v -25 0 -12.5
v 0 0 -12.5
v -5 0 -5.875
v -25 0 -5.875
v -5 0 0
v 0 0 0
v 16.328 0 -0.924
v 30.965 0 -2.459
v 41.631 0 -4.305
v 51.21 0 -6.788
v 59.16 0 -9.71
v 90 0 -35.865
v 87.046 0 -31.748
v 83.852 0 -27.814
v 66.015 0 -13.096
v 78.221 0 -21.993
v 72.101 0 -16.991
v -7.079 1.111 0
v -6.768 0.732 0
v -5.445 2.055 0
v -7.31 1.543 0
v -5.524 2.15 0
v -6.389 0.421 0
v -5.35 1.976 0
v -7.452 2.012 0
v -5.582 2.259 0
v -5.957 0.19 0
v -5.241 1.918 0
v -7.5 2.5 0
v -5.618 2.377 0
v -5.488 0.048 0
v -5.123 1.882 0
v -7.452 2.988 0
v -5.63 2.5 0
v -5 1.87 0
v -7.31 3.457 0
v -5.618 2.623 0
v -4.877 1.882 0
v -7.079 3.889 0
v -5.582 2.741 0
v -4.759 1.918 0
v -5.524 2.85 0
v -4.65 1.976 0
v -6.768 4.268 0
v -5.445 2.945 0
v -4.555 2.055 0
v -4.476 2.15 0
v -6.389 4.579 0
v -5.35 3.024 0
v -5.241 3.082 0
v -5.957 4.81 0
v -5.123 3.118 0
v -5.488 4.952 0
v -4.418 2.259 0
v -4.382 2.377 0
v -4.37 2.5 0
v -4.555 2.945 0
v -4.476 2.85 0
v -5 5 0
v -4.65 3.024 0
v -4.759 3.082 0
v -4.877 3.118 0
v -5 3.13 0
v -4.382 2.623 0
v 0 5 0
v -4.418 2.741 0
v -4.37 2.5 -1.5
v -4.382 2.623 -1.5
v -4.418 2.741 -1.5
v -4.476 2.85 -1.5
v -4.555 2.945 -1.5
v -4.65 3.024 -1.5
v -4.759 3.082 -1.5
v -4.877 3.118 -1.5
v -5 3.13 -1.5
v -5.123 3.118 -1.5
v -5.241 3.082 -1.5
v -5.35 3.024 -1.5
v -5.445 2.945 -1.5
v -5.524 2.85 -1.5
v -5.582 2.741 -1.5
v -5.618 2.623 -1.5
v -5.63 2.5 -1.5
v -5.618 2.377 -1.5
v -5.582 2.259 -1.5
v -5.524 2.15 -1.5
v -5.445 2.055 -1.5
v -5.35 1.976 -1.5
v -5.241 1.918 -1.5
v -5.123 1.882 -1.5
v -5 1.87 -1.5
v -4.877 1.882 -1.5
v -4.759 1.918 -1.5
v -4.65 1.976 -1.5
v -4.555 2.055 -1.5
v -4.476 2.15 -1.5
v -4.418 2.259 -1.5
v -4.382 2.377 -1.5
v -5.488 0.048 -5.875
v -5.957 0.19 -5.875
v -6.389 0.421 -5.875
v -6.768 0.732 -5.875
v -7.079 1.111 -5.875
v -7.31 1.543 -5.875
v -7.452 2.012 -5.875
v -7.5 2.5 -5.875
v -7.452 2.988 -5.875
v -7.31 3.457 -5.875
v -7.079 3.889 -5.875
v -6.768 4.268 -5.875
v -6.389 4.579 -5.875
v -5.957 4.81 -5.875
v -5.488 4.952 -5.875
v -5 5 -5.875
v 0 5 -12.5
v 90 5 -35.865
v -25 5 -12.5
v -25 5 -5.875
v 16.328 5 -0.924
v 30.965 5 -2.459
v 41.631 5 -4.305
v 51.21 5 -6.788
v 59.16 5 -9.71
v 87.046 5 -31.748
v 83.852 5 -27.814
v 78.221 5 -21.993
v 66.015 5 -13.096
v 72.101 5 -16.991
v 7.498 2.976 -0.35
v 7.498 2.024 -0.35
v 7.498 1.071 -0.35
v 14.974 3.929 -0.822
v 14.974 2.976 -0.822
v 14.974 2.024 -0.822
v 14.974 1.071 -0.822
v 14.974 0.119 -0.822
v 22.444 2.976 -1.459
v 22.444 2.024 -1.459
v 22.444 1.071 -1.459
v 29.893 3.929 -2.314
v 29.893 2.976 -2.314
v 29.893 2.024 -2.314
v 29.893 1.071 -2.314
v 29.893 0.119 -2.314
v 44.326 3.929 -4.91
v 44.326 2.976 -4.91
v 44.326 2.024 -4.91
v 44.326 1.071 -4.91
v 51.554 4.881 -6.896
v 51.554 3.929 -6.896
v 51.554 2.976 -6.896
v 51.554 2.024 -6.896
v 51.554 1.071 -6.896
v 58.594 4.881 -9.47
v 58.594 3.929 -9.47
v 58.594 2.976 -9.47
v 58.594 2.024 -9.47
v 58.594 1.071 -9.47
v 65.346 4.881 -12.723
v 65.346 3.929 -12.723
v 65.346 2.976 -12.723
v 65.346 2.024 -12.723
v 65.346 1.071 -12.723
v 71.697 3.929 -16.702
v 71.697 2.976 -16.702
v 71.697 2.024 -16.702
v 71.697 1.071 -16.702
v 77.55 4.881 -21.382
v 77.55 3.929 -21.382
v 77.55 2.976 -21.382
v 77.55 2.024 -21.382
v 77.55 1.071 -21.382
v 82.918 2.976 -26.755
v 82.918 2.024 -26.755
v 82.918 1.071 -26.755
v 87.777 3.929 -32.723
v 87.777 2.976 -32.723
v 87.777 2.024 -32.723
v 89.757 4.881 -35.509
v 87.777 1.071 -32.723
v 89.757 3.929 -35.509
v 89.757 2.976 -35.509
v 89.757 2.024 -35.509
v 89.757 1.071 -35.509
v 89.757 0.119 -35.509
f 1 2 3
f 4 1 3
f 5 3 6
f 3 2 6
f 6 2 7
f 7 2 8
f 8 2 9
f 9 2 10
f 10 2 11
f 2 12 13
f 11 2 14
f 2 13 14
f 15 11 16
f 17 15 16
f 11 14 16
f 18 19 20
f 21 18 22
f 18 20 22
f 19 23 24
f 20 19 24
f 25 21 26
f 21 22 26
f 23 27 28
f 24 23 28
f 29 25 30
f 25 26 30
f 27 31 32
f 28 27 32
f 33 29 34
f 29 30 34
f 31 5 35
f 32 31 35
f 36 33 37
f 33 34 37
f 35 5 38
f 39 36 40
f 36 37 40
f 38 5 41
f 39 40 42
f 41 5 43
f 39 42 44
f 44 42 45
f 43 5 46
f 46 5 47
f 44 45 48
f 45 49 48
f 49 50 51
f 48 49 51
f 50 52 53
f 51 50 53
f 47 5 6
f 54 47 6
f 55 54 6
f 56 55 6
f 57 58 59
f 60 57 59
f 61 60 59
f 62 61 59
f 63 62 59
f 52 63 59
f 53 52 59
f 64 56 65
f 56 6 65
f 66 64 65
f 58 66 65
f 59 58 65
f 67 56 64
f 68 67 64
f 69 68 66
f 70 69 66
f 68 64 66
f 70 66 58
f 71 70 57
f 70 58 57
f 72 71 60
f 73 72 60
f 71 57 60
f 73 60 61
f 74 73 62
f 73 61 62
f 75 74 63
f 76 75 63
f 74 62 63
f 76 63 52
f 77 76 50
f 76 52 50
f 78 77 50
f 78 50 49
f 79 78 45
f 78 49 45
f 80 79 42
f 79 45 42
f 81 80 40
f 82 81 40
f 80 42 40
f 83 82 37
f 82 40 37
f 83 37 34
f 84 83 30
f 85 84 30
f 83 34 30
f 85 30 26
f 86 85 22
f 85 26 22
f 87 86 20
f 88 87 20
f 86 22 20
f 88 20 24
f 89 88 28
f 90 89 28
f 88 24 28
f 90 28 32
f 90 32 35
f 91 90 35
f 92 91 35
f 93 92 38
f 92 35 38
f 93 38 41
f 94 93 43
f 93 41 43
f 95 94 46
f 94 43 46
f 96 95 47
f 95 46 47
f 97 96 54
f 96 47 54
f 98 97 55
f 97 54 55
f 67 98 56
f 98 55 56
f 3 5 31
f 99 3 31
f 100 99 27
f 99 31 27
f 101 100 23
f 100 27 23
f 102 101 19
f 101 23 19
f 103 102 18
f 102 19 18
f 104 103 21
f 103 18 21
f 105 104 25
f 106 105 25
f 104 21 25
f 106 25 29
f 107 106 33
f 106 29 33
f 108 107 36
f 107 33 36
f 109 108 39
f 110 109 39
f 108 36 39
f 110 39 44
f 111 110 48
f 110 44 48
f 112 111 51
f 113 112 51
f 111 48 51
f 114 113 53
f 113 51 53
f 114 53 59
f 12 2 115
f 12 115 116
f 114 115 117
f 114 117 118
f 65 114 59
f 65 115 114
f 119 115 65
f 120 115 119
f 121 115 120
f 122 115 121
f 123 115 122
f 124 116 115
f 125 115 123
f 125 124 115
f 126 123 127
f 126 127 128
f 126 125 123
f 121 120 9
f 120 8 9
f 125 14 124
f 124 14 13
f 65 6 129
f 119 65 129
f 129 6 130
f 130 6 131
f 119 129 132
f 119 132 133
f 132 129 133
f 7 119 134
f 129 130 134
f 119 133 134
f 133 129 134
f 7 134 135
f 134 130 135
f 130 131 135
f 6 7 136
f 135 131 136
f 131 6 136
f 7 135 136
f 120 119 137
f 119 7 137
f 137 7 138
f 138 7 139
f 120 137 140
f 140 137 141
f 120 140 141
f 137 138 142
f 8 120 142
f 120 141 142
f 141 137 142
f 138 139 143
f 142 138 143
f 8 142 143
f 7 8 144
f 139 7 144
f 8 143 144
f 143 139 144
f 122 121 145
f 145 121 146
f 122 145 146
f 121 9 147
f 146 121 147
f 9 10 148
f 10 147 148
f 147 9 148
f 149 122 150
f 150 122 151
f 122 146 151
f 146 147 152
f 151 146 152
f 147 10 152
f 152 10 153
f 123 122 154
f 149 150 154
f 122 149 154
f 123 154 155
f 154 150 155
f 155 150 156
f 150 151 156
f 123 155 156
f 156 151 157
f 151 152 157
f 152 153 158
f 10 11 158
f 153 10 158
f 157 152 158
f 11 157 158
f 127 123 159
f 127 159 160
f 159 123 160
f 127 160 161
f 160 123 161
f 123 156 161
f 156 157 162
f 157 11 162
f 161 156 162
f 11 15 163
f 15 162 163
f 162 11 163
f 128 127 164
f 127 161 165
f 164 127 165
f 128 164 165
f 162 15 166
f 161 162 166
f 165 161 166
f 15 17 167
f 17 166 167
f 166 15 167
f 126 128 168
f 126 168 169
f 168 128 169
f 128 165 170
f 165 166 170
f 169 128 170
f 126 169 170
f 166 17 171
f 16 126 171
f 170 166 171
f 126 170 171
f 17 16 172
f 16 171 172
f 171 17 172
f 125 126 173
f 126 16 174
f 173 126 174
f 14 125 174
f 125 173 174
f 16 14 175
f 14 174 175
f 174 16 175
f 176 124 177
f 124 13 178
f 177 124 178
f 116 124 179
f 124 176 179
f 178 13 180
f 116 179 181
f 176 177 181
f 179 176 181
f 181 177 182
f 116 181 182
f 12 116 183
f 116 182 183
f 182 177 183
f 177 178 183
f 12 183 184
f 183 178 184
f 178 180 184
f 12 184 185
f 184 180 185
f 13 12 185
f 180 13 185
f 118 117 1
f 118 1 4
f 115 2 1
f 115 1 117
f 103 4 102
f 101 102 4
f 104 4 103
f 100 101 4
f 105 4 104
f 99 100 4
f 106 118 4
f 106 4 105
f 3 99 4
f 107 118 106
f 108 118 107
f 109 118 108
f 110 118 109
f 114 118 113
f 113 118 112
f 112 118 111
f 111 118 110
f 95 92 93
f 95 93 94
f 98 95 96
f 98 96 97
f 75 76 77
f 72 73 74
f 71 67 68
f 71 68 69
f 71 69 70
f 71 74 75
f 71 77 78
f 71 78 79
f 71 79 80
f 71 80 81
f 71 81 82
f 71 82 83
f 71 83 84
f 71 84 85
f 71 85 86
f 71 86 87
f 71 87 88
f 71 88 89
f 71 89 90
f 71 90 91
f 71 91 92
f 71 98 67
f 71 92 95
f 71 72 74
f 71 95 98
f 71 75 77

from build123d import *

# Parameters (mm, degrees)
SALIENTE_EXTRUIR1_DEPTH = 5
CROQUIS3_W              = 12.5
CROQUIS3_H              = 5
SALIENTE_EXTRUIR2_DEPTH = 25
CROQUIS6_R              = 0.63
CORTAR_EXTRUIR3_DEPTH   = 1.5
CORTAR_EXTRUIR4_DEPTH   = 5.875


with BuildPart() as part:
    # Croquis2 → Saliente-Extruir1 (new body)
    with BuildSketch(Plane(origin=(0, 0, 0), x_dir=(1, 0, 0), z_dir=(0, 1, 0))):
        with BuildLine():
            Line((0, 0), (0, 12.5))
            Line((0, 12.5), (90, 35.865427318))
            add(Edge.make_bspline(
                [(0, 0), (0.394136999, 0.015797336), (1.194952966, 0.048834045), (2.992448828, 0.125211317), (4.579856068, 0.200911656), (6.612637351, 0.301249971), (8.392251736, 0.398752477), (10.315878033, 0.509903005), (12.159048858, 0.626310038), (14.511736704, 0.785189542), (17.305717547, 0.994336582), (20.114398042, 1.2314722), (22.909905137, 1.499776667), (25.707540494, 1.796493489), (29.430521004, 2.232380684), (34.457318955, 2.928516321), (39.917638309, 3.8880509), (45.326966885, 5.105084916), (49.769918493, 6.319079443), (53.346159155, 7.448006204), (56.870231766, 8.730995456), (60.329622828, 10.180098556), (63.710264837, 11.804910517), (66.997597592, 13.611491814), (70.17732587, 15.601579919), (72.854283587, 17.500893709), (75.067204078, 19.237089159), (76.854732505, 20.752585132), (78.250168573, 22.004629224), (79.619707974, 23.303249768), (80.962355597, 24.647453618), (82.277321506, 26.036087115), (83.403178931, 27.288894321), (84.345387571, 28.382707102), (85.115533062, 29.306902867), (85.722715368, 30.053623655), (86.321025458, 30.807421985), (86.910712224, 31.56828047), (87.491255325, 32.335040025), (88.06431213, 33.109755161), (88.629936117, 33.892108149), (89.099903233, 34.555740193), (89.55695597, 35.215829282), (89.829292977, 35.613909175), (89.943246974, 35.781569234), (90, 35.865427318)],
                knots=[0.074822974, 0.074822974, 0.074822974, 0.074822974, 0.074822974, 0.090398408, 0.105973841, 0.121549274, 0.137124708, 0.152700141, 0.168275574, 0.183851007, 0.199426441, 0.230577307, 0.261728173, 0.277303606, 0.29287904, 0.324029906, 0.386331636, 0.445924571, 0.477075434, 0.508226306, 0.539377159, 0.57052801, 0.601678868, 0.632829681, 0.663980451, 0.695131352, 0.726282194, 0.741857688, 0.757433182, 0.773008671, 0.788584161, 0.804576906, 0.820569651, 0.836562506, 0.844558934, 0.852555362, 0.860551891, 0.86854842, 0.87654495, 0.884541479, 0.89253801, 0.900534541, 0.908531072, 0.912529338, 0.916527603, 0.916527603, 0.916527603, 0.916527603, 0.916527603], degree=4))
        make_face()
    extrude(amount=SALIENTE_EXTRUIR1_DEPTH)

    # Croquis3 → Saliente-Extruir2 (add)
    with BuildSketch(Plane.ZY):
        with Locations((-6.25, 2.5)):
            Rectangle(CROQUIS3_W, CROQUIS3_H)
    extrude(amount=SALIENTE_EXTRUIR2_DEPTH)

    # Croquis6 → Cortar-Extruir3 (cut)
    with BuildSketch(Plane.XY):
        with Locations((-5, 2.5)):
            Circle(CROQUIS6_R)
    extrude(amount=-CORTAR_EXTRUIR3_DEPTH, mode=Mode.SUBTRACT)

    # Croquis5 → Cortar-Extruir4 (cut)
    with BuildSketch(Plane.XY):
        with BuildLine():
            Line((-25, 5), (-25, 0))
            Line((-25, 0), (-4.999999991, 0))
            ThreePointArc((-4.999999991, 0), (-7.5, 2.499999995), (-5, 5))
            Line((-5, 5), (-25, 5))
        make_face()
    extrude(amount=-CORTAR_EXTRUIR4_DEPTH, mode=Mode.SUBTRACT)


solid = part.part
